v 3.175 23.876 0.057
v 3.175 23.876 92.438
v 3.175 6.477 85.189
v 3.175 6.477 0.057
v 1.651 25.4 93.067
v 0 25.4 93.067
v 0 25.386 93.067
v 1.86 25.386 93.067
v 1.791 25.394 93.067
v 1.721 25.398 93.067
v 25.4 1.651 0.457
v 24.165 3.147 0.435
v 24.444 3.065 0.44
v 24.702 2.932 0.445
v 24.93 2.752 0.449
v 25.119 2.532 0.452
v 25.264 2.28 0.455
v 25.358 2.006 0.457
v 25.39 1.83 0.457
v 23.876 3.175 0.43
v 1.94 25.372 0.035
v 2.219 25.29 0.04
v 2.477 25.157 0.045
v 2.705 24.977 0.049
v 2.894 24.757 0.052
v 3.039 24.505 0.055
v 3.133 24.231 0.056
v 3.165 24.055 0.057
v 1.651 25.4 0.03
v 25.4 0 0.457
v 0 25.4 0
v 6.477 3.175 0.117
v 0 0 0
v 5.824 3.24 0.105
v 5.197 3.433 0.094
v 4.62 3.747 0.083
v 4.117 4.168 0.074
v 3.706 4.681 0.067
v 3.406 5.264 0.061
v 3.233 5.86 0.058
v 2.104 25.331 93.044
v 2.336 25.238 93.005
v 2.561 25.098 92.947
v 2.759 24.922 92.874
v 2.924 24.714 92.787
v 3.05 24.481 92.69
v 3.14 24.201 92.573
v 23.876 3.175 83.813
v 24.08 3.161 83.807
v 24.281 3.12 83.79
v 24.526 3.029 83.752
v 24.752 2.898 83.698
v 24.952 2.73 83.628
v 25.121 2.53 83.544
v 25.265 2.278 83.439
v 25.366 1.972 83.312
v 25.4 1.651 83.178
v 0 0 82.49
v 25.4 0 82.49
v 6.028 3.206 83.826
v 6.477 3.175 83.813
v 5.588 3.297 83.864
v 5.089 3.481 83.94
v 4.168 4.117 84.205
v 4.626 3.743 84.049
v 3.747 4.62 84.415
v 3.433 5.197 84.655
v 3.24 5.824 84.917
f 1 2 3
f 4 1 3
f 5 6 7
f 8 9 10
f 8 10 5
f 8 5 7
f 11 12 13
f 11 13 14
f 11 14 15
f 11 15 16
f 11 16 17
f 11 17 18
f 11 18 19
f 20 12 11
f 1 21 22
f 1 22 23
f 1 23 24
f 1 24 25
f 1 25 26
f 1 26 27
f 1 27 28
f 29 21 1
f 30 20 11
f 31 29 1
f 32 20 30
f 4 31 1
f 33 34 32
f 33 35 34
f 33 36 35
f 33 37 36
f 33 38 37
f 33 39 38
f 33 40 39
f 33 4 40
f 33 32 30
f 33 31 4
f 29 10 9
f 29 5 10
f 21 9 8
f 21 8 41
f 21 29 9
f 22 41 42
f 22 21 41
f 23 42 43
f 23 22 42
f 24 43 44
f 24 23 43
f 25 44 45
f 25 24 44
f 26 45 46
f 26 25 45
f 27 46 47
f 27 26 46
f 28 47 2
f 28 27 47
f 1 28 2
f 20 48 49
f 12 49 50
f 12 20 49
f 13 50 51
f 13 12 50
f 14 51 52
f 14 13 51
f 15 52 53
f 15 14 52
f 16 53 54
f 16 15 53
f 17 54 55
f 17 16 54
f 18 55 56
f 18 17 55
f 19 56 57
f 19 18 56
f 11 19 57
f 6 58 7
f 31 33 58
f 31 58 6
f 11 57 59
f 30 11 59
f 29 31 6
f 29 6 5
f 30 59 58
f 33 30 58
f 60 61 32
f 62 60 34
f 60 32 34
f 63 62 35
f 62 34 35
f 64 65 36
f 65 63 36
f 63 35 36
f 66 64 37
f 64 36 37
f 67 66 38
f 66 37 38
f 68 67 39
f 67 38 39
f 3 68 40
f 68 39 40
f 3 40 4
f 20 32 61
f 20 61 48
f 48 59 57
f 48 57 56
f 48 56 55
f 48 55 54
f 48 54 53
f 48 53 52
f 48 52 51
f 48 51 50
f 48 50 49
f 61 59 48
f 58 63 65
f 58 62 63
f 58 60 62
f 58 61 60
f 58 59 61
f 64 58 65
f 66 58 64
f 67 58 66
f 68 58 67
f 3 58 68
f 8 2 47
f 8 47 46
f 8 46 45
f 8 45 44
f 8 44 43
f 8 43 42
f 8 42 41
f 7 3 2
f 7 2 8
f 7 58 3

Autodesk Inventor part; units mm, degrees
ref_plane "Start Plane" through (0, 0, 0) normal (0, 0, 1) x (1, 0, 0)
ref_plane "End Plane" through (0, 0, 93.0667) normal (0, 0, 1) x (1, 0, 0)
sketch "Sketch" plane through (0, 0, 0) normal (0, 0, 1) x (1, 0, 0)
  line L0 (25.4, 0) -> (0, 0)
  line L1 (0, 0) -> (0, 25.4)
  line L2 (0, 25.4) -> (1.651, 25.4)
  line L3 (3.175, 23.876) -> (3.175, 6.477)
  line L4 (6.477, 3.175) -> (23.876, 3.175)
  line L5 (25.4, 1.651) -> (25.4, 0)
  line L6 (0, -11.0414) -> (0, 31.5385) construction
  line L7 (-11.0414, 0) -> (31.5385, 0) construction
  arc A0 (3.175, 6.477) -> (6.477, 3.175) centre (6.477, 6.477) ccw
  arc A1 (3.175, 23.876) -> (1.651, 25.4) centre (1.651, 23.876) ccw
  arc A2 (25.4, 1.651) -> (23.876, 3.175) centre (23.876, 1.651) ccw
  line L8 (0, 40.0545) -> (0, -19.5574) construction
  line L9 (-19.5574, 0) -> (40.0545, 0) construction
  point P0 (3.175, 25.4)
  point P1 (3.175, 3.175)
  point P2 (25.4, 3.175)
  dimension "d0" = 25.4
  dimension "d1" = 25.4
  dimension "d2" = 3.175
  dimension "d3" = 3.175
  dimension "d10" = 0
  dimension "d11" = 0
  dimension "d14" = 3.302
  dimension "d15" = 1.524
extrude "Body" add sketch "Sketch" along normal up to surface (93.0667 mm away) from surface at 0
sketch "Sketch3" plane through (0, 0, 0) normal (0, 0, 1) x (1, 0, 0)
  line L0 (0, 0) -> (10, 0)
ref_plane "Work Plane3" through (0, 0, 0) normal (0, -1, 0) x (1, 0, 0)
ref_plane "Work Plane4" through (0, 12.7, 0) normal (0.018, 0, -0.9998) x (-0.9998, 0, -0.018)
split "Split1" plane through (0, 12.7, 0) removes the side toward (0.018, 0, -0.9998)
ref_plane "Work Plane5" through (1.651, 249.7692, 186.5538) normal (0, -0.3846, 0.9231) x (1, 0, 0)
split "Split2" plane through (1.651, 249.7692, 186.5538) removes the side toward (0, -0.3846, 0.9231)
sketch "Sketch4" plane through (0, 0, 0) normal (0, -1, 0) x (1, 0, 0)
  line L0 (-2, 0) -> (12, 0) projected
  line L1 (-2, 93.0667) -> (12, 93.0667) projected
  dimension "d17" = 93.0667
equation "\"d0\" = G_H"
equation "\"d1\" = G_H"
equation "\"d2\" = G_T"
equation "\"d3\" = G_T"
equation "\"d14\" = G_IR"
equation "\"d15\" = G_ER"
equation "\"d4\" = G_L"
equation "\"G_H\" = 25.4"
equation "\"G_T\" = 3.175"
equation "\"G_ER\" = 1.524"
equation "\"G_IR\" = 3.302"
equation "\"G_L\" = d17"
equation "\"ex\" = 0"
equation "\"G_OFFSET_START\" = 0"
equation "\"G_OFFSET_END\" = -16.93333"
equation "\"d13\" = G_OFFSET_END + B_L"
equation "\"B_L\" = 110"
properties part number "AISC - L 1 x 1 x 1/8 - 3.664" material "Steel, Mild"
